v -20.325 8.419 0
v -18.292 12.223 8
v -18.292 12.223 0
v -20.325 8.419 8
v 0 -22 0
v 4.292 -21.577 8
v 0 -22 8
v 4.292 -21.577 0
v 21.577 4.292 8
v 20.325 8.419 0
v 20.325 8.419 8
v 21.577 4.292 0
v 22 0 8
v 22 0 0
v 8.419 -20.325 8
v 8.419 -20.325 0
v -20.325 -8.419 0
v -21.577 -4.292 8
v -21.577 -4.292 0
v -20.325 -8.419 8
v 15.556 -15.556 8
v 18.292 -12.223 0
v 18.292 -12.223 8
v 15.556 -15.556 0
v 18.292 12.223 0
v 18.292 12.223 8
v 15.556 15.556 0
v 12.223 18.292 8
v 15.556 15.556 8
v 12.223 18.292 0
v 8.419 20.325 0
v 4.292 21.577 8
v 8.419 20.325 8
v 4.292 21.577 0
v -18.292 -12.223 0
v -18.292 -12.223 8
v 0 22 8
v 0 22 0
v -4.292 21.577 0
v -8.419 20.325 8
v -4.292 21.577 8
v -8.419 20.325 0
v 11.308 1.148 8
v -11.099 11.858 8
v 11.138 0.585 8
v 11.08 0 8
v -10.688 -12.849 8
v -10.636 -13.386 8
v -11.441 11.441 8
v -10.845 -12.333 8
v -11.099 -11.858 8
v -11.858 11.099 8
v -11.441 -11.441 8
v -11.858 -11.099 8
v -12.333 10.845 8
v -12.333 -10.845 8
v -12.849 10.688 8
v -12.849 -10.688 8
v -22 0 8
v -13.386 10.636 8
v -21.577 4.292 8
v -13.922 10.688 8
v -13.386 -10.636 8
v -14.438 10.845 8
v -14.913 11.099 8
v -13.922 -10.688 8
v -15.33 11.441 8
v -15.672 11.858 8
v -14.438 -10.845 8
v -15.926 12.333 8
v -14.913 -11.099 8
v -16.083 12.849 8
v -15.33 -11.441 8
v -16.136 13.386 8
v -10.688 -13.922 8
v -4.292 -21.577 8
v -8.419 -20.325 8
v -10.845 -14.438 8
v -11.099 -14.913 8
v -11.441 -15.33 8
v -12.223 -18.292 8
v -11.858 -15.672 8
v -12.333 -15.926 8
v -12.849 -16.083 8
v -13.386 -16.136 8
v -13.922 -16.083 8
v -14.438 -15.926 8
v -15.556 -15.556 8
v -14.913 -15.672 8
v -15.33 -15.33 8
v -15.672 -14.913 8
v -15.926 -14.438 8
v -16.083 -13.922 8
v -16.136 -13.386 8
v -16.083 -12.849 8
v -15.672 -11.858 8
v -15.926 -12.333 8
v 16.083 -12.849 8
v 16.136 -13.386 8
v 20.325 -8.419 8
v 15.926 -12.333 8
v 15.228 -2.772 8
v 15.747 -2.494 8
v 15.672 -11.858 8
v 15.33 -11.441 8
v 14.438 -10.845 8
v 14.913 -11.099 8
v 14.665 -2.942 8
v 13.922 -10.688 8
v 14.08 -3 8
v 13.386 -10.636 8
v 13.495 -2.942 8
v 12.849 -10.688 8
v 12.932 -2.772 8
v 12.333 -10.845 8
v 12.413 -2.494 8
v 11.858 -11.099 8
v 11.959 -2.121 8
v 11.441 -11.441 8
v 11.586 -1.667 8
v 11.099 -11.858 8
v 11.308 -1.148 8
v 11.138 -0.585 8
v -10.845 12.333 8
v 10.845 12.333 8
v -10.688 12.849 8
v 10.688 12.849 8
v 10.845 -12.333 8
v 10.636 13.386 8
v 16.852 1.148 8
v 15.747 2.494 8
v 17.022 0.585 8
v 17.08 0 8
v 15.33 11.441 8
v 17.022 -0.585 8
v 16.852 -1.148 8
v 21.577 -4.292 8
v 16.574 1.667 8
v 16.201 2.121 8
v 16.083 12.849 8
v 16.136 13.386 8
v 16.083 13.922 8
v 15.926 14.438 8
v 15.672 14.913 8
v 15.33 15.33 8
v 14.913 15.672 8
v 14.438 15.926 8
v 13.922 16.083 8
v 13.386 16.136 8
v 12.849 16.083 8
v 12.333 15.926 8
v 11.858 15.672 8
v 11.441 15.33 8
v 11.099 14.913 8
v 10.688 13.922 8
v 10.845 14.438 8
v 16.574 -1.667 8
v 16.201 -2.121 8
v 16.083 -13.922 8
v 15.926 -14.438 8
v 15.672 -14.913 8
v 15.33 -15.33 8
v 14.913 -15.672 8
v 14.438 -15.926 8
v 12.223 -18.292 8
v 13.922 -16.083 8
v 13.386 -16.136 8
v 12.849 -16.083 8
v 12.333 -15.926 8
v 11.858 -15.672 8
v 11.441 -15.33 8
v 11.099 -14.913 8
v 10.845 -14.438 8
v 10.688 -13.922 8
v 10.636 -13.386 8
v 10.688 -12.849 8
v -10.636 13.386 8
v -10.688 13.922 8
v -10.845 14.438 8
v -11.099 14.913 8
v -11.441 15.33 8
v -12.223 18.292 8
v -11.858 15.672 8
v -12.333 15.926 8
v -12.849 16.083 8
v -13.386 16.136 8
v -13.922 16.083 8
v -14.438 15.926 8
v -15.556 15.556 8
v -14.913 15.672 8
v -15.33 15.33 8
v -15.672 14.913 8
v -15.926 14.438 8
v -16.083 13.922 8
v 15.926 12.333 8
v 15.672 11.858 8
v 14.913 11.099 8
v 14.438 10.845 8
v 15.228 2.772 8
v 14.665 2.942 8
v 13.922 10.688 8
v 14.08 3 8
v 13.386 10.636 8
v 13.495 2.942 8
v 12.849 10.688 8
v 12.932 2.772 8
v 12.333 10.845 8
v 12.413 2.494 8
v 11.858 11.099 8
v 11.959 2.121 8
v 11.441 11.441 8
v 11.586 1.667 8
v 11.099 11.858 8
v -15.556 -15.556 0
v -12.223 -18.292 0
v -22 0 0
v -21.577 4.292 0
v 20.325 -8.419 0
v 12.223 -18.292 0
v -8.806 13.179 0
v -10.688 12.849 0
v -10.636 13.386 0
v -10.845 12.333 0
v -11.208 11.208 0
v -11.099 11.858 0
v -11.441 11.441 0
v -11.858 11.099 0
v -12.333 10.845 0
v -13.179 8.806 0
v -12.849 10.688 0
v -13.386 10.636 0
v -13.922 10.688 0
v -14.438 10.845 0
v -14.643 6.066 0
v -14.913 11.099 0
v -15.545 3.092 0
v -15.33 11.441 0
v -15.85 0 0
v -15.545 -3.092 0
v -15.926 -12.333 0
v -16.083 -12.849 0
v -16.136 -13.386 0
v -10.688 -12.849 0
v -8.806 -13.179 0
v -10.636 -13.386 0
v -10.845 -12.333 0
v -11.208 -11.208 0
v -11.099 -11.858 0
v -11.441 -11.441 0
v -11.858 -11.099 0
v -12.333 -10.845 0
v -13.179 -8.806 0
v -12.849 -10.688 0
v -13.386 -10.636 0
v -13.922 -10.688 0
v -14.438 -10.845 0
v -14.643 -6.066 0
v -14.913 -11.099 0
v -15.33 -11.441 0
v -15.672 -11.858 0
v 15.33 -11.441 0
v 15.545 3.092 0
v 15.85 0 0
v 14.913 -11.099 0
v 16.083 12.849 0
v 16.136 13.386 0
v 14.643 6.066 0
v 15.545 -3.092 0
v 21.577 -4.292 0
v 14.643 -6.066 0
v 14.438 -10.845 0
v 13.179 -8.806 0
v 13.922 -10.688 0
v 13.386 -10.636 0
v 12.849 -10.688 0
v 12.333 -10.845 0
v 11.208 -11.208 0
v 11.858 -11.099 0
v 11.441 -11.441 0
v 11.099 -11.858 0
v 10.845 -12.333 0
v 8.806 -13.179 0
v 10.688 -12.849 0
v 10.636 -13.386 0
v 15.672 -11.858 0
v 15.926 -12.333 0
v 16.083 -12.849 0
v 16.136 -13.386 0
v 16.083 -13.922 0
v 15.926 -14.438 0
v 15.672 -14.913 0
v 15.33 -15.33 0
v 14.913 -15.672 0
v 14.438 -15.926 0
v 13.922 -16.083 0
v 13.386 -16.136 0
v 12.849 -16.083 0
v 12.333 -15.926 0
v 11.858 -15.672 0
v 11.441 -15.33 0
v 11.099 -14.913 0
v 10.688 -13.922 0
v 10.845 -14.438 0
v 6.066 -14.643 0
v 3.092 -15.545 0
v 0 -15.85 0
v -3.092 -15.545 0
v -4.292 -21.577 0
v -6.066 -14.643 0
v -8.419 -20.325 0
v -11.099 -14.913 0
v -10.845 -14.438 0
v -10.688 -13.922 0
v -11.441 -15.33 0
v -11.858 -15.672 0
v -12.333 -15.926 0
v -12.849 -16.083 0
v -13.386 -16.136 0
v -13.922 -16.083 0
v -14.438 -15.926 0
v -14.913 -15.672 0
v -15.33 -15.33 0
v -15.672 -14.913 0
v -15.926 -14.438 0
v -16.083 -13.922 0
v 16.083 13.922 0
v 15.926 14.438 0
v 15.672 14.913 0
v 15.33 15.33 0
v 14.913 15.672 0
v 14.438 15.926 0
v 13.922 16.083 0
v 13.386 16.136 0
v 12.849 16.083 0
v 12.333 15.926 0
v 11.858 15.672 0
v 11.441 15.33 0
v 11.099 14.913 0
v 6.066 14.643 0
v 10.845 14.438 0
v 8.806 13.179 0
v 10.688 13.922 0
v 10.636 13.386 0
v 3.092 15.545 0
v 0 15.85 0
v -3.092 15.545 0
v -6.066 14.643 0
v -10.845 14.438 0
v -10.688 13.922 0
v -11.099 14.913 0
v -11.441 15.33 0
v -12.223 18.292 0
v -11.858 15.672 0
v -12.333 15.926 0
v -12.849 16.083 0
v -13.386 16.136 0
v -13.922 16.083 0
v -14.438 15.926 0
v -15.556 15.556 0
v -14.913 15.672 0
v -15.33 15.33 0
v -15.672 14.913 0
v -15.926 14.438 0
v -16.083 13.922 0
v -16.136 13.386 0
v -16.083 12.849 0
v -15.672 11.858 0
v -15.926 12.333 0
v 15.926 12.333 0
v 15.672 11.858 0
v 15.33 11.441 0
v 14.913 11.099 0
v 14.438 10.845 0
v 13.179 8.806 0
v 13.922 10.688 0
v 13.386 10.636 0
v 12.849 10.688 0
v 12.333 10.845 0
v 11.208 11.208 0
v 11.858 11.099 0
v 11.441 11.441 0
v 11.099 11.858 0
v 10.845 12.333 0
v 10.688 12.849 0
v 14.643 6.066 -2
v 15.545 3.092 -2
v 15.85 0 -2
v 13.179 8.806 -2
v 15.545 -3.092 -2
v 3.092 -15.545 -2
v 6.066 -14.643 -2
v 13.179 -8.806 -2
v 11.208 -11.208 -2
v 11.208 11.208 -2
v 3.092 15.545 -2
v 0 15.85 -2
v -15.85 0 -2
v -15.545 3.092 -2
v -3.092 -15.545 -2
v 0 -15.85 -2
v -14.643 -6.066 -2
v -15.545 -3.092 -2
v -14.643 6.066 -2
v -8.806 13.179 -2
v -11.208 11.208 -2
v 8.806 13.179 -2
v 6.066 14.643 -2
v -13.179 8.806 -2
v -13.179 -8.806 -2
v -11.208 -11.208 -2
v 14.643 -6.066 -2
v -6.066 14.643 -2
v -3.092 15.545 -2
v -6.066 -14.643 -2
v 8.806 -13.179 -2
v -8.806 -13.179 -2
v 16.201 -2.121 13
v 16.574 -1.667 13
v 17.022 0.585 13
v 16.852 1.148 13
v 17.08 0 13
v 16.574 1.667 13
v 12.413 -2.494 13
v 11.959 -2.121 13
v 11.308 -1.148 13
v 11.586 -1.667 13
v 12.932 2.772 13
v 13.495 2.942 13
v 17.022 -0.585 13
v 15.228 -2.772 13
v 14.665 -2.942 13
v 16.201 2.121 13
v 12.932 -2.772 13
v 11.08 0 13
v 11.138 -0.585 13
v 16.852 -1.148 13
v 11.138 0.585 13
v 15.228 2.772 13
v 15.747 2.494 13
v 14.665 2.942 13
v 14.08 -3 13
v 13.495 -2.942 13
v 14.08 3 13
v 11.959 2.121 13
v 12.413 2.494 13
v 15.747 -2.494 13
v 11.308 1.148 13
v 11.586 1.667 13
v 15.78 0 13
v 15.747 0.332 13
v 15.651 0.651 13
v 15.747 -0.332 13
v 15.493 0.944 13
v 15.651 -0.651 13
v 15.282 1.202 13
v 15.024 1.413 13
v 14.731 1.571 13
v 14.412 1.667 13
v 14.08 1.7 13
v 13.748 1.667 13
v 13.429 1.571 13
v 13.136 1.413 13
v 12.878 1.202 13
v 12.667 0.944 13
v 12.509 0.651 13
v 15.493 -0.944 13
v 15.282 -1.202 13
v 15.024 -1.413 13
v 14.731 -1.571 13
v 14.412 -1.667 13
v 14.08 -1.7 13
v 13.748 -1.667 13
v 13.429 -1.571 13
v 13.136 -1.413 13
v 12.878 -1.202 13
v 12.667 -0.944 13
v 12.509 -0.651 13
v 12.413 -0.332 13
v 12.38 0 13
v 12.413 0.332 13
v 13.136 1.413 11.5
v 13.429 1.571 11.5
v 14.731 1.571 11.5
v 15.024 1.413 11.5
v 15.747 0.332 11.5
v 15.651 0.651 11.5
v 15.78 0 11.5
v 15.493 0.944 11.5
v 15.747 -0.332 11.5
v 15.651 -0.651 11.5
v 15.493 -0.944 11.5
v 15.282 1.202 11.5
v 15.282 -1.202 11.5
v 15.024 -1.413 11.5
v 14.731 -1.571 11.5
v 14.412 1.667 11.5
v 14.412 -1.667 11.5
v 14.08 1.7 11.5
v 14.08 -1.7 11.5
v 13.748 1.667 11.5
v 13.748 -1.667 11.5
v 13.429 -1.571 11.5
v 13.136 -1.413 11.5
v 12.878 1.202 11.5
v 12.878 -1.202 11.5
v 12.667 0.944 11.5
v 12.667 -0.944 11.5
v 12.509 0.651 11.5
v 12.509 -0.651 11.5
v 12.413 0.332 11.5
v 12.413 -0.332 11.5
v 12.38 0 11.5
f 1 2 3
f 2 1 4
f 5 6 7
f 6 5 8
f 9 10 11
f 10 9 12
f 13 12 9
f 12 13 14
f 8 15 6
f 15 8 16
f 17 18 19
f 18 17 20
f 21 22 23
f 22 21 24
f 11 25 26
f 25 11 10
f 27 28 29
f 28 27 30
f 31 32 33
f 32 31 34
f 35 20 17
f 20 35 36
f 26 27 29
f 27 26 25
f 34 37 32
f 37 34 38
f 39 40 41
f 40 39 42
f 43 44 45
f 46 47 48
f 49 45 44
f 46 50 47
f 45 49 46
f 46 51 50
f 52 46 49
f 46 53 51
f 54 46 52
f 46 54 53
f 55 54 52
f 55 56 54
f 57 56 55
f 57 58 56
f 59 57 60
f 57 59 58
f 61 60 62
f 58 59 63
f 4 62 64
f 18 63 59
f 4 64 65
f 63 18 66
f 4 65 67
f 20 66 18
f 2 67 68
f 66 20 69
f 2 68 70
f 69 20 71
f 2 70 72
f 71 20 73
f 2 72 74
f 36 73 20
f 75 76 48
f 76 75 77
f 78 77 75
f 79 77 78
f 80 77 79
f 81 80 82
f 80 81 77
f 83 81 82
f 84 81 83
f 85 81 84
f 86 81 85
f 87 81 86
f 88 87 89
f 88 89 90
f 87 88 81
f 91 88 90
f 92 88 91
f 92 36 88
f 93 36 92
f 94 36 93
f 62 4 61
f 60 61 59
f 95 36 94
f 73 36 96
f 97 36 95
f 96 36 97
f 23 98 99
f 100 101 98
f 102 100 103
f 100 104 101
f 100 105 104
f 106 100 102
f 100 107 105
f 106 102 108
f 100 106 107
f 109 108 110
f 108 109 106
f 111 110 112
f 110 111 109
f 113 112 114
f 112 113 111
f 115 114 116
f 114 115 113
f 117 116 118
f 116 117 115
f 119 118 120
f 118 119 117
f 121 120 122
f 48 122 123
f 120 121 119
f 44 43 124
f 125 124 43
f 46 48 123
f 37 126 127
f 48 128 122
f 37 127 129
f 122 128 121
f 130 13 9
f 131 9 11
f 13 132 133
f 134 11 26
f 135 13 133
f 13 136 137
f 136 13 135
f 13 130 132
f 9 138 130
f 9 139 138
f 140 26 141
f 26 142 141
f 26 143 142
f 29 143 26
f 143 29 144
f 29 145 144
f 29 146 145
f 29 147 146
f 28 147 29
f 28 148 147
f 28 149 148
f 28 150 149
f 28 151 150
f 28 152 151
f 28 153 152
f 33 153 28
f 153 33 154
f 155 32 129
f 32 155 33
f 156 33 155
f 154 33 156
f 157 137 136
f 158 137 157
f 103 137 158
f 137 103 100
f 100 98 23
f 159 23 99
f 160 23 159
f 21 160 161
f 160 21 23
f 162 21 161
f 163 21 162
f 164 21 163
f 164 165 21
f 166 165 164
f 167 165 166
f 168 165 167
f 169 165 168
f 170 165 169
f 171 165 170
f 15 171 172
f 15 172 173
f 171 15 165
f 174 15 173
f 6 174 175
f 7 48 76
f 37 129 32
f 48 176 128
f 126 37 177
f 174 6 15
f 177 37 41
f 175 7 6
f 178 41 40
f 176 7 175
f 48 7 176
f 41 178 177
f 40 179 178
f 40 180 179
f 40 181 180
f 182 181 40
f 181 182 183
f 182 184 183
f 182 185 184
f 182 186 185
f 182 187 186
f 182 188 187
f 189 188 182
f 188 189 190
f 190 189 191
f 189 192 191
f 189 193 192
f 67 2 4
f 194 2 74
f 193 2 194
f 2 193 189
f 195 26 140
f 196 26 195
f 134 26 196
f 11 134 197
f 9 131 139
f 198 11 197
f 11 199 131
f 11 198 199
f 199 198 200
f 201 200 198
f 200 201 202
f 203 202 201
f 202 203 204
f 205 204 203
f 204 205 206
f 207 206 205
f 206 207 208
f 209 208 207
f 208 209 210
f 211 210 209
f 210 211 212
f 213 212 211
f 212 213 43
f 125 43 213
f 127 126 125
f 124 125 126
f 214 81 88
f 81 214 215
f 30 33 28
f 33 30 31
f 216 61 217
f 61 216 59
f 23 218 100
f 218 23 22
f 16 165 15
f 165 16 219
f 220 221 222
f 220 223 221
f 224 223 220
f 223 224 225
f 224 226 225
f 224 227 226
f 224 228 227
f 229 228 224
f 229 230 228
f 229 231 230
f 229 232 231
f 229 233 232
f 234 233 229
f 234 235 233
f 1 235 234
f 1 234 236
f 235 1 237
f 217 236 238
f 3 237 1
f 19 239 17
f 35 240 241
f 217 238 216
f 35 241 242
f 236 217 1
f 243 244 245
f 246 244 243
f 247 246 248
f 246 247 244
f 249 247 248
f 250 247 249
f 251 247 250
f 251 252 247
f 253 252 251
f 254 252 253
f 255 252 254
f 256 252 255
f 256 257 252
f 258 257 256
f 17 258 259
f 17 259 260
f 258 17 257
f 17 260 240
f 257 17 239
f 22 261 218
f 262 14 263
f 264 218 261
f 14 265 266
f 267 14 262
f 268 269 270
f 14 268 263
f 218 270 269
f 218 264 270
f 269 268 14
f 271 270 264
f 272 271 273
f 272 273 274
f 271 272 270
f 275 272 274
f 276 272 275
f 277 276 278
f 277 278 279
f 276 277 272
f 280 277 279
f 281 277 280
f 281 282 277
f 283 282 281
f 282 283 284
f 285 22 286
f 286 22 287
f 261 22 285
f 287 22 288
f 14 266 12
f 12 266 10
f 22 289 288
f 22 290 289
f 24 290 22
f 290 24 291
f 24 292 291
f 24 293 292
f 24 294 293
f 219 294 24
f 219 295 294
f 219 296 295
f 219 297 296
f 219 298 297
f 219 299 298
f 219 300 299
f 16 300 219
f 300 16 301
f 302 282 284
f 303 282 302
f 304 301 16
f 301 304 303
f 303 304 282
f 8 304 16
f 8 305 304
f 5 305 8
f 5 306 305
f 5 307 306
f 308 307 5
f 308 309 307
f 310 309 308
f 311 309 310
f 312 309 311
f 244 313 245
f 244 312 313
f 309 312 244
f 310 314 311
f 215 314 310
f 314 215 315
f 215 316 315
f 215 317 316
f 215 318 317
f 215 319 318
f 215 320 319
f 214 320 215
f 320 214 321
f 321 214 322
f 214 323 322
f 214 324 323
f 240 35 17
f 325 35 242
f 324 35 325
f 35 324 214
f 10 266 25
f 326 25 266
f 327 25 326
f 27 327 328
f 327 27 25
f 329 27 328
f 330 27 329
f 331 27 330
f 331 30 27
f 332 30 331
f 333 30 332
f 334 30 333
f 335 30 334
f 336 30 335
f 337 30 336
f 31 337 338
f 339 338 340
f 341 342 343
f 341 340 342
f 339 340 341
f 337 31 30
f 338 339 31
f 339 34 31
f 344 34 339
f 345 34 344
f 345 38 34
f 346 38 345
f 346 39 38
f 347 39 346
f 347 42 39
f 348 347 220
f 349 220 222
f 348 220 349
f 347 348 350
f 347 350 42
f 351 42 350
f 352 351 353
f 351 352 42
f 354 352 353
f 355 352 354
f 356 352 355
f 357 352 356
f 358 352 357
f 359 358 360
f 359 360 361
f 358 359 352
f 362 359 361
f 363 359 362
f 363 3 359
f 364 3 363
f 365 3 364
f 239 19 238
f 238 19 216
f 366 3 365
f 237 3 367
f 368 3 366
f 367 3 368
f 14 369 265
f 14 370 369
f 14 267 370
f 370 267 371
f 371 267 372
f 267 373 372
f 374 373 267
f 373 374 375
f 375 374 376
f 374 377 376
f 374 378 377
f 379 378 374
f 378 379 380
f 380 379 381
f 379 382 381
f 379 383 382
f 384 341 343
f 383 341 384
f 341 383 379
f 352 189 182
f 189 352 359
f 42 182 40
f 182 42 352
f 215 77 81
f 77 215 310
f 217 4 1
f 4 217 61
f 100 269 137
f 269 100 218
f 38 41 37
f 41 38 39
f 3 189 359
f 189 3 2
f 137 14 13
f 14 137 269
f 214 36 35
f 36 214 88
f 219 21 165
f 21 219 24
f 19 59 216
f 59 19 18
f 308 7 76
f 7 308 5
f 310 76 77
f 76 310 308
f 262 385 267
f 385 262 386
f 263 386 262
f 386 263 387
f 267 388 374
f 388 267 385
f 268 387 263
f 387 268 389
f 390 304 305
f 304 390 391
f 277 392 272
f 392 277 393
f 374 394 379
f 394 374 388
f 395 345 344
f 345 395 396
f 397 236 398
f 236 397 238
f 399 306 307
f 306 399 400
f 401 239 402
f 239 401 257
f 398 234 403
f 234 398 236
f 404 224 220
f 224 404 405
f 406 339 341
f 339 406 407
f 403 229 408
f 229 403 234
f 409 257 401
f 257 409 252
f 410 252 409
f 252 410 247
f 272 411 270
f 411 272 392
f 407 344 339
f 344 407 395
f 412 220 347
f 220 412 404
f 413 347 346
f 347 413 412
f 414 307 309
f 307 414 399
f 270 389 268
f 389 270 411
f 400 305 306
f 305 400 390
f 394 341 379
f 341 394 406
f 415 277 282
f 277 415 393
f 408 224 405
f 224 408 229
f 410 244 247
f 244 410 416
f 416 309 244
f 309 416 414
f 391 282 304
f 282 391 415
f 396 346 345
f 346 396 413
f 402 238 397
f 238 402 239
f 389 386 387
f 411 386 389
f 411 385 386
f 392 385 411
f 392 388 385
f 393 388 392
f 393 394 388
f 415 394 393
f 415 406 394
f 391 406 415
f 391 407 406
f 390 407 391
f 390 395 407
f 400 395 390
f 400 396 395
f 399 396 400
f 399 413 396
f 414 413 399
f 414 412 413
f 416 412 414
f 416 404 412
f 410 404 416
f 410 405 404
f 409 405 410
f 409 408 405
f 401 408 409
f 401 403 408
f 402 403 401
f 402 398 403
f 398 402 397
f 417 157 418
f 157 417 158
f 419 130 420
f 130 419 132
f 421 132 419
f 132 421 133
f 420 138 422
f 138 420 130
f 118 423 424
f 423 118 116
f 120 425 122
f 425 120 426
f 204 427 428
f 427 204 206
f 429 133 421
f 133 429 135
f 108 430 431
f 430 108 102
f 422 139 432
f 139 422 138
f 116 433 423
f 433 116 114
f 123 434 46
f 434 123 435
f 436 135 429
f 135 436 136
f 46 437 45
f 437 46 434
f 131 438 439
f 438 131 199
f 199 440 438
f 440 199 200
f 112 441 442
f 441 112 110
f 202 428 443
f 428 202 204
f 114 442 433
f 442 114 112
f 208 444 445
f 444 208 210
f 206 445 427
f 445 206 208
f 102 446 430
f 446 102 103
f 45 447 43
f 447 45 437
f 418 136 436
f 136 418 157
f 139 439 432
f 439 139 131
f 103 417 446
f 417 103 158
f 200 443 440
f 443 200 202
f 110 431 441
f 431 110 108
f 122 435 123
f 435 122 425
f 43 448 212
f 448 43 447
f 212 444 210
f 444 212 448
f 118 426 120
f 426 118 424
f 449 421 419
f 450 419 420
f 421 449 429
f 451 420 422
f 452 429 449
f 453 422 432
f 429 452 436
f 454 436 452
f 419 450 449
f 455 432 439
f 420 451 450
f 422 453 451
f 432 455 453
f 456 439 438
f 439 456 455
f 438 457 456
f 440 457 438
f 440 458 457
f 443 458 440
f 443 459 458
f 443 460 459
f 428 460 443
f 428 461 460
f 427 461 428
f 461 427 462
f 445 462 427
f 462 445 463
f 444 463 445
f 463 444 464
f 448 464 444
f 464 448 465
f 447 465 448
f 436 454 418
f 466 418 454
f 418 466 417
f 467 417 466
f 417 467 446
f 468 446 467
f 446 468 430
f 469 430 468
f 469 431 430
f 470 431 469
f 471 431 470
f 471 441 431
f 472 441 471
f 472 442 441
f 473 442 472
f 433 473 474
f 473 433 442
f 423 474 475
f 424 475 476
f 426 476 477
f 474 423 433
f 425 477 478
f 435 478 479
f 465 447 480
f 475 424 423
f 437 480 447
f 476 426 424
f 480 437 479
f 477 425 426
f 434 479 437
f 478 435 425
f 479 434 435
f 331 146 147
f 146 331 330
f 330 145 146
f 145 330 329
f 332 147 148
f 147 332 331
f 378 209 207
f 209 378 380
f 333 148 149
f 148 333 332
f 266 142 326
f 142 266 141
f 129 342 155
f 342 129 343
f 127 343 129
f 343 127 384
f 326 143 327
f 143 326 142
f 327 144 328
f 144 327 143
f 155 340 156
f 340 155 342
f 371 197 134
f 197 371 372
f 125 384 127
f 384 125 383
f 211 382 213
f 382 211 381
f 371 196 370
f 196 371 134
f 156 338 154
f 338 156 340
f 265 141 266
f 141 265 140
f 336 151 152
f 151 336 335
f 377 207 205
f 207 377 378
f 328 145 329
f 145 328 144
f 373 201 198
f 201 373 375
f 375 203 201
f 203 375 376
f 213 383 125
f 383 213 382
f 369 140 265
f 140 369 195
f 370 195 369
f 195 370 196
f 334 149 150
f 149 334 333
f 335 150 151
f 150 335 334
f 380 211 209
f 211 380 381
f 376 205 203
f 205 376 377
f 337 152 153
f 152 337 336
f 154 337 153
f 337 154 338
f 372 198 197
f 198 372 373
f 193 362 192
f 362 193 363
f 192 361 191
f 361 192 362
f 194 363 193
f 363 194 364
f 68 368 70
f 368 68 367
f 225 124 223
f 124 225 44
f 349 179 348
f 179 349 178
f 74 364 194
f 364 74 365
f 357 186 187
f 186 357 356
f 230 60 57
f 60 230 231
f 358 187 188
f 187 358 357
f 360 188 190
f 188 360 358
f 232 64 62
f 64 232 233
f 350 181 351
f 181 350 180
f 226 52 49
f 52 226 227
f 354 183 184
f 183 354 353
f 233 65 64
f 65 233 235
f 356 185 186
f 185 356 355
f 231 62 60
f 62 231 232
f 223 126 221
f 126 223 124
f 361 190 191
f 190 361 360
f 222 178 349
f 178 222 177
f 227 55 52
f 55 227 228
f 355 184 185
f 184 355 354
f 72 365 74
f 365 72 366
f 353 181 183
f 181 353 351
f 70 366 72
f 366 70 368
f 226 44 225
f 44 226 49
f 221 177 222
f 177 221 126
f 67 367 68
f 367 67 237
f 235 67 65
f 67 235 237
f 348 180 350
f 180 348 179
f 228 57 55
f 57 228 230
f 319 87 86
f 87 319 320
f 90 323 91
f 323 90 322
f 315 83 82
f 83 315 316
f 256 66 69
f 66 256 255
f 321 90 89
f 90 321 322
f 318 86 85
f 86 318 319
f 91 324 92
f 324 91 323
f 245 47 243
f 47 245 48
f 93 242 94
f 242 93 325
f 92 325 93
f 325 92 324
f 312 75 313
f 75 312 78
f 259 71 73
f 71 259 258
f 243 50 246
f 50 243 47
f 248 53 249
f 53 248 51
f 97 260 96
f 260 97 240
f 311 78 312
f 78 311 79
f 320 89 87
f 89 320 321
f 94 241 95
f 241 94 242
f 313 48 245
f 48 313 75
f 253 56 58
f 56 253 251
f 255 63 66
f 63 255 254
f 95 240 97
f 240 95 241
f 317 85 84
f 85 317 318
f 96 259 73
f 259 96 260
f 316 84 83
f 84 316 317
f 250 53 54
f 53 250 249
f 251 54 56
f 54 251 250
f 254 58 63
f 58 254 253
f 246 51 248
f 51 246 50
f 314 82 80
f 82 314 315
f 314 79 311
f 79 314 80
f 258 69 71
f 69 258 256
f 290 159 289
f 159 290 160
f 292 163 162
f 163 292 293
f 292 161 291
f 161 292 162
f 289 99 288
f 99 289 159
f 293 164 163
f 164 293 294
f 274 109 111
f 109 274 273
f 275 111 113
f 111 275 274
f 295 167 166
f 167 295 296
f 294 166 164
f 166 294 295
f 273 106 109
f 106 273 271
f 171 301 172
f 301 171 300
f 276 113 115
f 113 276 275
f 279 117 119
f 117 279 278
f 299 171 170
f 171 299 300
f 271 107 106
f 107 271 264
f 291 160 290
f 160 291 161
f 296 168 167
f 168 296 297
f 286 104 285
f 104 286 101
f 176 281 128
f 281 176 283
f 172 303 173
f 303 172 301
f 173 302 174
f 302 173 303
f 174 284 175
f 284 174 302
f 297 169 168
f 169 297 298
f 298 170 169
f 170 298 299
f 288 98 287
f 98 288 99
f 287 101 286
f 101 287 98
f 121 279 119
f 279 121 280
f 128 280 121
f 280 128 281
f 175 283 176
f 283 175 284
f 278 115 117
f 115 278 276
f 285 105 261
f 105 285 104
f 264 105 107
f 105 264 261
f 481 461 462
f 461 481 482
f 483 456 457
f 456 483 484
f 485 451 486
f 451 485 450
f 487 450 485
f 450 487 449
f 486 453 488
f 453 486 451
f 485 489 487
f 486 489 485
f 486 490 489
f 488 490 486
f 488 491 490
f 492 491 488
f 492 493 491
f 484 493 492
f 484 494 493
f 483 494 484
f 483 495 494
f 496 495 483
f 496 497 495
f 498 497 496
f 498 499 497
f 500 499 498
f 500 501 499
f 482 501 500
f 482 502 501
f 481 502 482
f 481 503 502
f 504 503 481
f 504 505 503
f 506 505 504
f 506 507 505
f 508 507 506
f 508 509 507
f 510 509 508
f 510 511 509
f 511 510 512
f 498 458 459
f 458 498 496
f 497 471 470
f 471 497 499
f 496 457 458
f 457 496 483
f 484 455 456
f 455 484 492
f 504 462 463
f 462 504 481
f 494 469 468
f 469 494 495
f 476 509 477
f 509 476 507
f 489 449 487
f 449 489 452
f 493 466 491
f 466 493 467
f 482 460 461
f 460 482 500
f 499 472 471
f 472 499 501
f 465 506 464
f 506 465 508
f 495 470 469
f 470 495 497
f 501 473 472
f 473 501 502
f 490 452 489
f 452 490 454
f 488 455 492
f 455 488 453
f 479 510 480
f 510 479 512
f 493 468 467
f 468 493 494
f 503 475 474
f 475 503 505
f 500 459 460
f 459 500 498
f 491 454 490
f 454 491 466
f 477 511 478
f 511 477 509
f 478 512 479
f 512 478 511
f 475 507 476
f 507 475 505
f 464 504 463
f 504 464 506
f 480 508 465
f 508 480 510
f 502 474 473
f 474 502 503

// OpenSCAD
$fn = 32;

// ----------------------------------------------------------------------
// Retaining cap: 6002 cover, 44 mm, spigot 31.7 mm
// ----------------------------------------------------------------------

// --- parameters (mm) ---
plate_d = 44;             // cover diameter
plate_t = 8;              // cover thickness
boss_d = 31.7;            // spigot that enters the housing
boss_h = 2;               // spigot height
bolt_d = 5.5;             // bolt clearance
bolt_r = 18.93;           // bolt circle radius
nipple_d = 6;             // grease nipple boss
nipple_h = 5;             // grease nipple boss height

module cover() {
  cylinder(h = plate_t, d = plate_d);
}

module spigot() {
  /* sunk 1 mm into the cover; the spigot sets the overall height */
  translate([0, 0, -boss_h]) cylinder(h = boss_h + 1, d = boss_d);
}

module nipple() {
  translate([plate_d * 0.32, 0, plate_t - 1])
    cylinder(h = nipple_h + 1, d = nipple_d);
}

difference() {
  union() {
    cover();
    spigot();
    nipple();
  }
  for (i = [0 : 3]) rotate([0, 0, 45 + i * 90]) translate([bolt_r, 0, -boss_h - 1])
    cylinder(h = boss_h + plate_t + 2, d = bolt_d);
  translate([plate_d * 0.32, 0, plate_t + nipple_h - 1.5]) cylinder(h = 4, d = 3.4);
}
